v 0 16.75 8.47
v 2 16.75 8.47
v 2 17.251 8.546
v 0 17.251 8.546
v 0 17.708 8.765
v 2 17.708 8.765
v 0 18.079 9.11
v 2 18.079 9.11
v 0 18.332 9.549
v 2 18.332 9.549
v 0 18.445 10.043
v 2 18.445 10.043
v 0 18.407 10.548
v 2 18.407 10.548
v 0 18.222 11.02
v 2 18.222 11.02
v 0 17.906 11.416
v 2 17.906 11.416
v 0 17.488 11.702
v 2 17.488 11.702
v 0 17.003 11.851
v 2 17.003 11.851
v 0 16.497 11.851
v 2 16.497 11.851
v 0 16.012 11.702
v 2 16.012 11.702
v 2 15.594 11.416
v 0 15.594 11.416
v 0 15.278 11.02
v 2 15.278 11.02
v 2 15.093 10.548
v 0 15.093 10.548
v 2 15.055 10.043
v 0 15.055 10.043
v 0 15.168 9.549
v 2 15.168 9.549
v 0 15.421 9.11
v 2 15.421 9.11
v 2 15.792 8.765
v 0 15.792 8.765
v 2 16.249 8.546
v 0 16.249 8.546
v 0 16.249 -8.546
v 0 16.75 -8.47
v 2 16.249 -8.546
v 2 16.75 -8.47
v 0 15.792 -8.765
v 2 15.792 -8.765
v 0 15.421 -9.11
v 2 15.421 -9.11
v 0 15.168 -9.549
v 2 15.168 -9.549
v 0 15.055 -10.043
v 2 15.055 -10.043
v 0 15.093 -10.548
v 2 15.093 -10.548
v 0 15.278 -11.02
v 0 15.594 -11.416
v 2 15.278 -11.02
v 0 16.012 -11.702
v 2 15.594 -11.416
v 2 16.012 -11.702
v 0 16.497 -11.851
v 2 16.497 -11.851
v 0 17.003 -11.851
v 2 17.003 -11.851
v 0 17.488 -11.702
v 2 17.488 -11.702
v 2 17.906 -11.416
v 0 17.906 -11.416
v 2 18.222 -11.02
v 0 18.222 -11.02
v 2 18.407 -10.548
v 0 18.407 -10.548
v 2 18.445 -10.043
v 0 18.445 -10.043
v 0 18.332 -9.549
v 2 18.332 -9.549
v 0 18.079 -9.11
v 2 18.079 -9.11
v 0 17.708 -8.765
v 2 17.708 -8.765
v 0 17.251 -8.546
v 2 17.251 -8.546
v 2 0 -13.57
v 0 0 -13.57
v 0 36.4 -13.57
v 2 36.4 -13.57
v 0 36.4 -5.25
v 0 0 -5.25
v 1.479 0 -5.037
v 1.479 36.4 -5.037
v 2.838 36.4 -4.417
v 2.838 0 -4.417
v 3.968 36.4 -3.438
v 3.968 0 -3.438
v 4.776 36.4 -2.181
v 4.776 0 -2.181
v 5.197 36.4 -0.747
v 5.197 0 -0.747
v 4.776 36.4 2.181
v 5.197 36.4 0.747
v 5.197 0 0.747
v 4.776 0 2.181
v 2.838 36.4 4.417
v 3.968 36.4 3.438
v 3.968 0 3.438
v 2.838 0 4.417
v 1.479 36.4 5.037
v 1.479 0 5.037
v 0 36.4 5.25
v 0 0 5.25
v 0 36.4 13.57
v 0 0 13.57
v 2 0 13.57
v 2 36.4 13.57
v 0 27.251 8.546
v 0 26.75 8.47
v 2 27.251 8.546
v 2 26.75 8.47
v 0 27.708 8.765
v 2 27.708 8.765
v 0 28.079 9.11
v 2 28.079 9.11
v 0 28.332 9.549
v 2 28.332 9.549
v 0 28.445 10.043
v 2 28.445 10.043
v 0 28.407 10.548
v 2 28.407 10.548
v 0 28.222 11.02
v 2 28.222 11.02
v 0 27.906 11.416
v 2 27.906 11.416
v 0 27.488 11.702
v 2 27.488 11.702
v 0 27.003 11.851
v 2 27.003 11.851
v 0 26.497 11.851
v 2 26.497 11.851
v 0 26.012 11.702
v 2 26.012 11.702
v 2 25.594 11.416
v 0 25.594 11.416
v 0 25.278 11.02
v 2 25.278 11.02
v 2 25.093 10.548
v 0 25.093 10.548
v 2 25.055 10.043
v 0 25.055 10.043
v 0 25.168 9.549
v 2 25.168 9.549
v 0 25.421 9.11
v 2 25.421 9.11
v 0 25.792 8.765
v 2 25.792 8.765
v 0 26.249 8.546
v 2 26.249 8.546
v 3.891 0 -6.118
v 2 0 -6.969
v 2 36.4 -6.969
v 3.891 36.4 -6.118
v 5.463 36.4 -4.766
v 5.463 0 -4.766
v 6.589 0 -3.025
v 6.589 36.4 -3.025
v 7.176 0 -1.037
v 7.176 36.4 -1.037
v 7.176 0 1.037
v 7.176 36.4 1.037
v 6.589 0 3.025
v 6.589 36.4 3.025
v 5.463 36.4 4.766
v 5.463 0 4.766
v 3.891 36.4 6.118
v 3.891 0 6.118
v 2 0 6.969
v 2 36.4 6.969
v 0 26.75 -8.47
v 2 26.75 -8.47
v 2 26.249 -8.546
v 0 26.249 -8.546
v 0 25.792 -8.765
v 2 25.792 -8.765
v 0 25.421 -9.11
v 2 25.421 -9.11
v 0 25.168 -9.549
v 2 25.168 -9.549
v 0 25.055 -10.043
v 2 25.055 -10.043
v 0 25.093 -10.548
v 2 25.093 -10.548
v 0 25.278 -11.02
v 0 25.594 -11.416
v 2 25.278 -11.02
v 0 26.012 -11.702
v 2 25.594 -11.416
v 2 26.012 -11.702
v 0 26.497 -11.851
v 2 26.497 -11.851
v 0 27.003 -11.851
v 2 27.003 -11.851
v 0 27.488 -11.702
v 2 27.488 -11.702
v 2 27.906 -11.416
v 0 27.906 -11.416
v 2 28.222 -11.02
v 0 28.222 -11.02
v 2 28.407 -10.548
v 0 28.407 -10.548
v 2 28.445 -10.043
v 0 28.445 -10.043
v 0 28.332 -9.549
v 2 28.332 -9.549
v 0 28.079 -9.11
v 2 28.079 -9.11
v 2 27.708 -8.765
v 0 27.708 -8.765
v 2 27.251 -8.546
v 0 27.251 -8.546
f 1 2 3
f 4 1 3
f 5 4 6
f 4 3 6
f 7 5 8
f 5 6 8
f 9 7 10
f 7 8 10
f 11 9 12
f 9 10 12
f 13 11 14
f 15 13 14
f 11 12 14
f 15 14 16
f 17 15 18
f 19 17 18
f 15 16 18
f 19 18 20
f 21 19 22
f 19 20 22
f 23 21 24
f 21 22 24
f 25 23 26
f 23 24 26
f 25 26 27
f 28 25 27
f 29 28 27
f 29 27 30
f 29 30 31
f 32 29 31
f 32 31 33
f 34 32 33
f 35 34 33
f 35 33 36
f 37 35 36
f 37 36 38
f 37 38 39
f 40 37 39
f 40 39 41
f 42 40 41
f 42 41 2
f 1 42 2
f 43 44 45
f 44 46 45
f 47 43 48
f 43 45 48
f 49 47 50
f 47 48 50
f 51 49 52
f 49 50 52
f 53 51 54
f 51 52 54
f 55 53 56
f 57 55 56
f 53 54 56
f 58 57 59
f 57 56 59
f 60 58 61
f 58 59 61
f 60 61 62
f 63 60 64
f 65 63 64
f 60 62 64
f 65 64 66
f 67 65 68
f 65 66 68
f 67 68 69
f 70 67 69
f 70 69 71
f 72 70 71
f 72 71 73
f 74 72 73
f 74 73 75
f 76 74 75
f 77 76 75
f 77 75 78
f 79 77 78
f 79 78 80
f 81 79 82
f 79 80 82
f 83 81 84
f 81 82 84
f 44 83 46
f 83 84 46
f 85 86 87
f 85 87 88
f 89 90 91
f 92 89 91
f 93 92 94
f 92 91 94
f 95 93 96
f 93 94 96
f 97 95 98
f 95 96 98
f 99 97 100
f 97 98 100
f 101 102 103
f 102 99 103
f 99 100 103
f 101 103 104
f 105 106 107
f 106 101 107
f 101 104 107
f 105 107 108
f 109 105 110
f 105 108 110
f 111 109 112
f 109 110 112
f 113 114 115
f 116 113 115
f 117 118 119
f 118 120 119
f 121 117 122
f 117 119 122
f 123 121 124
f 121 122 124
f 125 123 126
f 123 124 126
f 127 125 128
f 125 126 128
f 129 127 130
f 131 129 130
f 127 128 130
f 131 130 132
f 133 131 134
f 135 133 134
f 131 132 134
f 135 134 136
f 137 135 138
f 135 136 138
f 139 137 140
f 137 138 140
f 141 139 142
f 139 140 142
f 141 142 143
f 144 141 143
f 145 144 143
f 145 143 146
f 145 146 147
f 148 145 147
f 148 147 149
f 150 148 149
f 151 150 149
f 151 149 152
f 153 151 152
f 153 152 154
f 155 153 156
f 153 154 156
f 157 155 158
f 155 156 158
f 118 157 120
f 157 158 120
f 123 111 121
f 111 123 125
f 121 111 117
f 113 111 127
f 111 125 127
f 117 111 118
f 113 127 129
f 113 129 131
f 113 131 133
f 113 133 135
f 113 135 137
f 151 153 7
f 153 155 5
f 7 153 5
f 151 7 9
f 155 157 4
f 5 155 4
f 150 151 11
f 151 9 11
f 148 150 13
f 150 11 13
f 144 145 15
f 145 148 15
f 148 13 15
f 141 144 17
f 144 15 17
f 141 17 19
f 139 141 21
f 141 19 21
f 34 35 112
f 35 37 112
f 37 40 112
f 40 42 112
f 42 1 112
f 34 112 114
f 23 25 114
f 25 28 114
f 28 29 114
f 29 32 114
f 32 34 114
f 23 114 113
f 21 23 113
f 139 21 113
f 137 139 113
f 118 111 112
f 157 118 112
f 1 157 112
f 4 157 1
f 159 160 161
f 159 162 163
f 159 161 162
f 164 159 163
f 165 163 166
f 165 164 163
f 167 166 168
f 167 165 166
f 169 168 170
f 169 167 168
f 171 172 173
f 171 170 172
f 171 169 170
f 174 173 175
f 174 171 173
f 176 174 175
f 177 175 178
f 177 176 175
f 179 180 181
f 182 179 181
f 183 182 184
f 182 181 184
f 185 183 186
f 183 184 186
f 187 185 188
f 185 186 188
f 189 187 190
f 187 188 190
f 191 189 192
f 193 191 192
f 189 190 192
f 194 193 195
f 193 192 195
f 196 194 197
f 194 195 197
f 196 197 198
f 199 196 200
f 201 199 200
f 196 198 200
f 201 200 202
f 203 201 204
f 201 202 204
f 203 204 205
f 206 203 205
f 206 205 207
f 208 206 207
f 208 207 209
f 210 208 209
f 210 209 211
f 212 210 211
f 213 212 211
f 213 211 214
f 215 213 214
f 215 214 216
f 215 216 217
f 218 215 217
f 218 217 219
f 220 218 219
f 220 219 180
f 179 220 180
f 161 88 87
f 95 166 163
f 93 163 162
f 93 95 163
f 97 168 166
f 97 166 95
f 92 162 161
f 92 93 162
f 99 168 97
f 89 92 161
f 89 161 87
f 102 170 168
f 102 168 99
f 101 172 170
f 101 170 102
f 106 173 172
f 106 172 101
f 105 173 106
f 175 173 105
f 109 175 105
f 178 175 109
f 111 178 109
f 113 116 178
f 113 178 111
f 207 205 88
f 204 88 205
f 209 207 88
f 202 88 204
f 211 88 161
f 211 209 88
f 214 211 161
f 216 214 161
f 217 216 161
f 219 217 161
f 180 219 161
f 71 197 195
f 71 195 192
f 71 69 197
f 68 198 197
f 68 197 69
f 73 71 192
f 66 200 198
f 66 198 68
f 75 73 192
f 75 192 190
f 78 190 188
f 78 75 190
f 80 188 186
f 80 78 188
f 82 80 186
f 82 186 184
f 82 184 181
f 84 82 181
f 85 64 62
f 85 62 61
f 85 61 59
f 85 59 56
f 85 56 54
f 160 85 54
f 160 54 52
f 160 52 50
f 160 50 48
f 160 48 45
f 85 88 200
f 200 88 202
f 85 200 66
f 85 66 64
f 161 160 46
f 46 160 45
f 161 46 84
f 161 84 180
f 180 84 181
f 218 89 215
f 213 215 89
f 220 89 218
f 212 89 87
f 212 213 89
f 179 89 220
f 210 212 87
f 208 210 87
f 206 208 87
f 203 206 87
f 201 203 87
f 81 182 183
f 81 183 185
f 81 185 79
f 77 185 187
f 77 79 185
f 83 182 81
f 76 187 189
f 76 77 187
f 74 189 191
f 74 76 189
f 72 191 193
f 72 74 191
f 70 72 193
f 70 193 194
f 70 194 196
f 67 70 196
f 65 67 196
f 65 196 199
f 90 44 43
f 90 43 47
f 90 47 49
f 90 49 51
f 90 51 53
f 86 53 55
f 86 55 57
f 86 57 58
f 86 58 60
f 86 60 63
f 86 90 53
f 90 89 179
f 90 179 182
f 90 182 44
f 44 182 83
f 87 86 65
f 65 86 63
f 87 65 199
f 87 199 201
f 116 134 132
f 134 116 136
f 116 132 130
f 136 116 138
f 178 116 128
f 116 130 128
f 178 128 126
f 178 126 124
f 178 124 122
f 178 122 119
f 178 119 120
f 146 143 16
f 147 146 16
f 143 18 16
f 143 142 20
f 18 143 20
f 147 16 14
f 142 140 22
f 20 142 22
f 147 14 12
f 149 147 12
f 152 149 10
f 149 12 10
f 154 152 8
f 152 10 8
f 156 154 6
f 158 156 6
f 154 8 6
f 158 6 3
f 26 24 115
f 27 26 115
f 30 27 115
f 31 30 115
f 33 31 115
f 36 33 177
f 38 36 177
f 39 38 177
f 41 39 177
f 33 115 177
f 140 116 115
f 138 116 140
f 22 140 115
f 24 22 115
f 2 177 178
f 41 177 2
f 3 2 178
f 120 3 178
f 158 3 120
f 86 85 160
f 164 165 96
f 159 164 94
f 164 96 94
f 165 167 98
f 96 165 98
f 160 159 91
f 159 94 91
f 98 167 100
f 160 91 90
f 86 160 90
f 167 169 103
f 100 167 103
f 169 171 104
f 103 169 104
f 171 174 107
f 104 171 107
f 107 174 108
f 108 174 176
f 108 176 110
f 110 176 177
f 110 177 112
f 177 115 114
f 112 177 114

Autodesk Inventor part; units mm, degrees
ref_plane "YZ Plane" through (0, 0, 0) normal (1, 0, 0) x (0, 1, 0)
ref_plane "XZ Plane" through (0, 0, 0) normal (0, 1, 0) x (-1, 0, 0)
ref_plane "XY Plane" through (0, 0, 0) normal (0, 0, 1) x (1, 0, 0)
sketch "스케치1" plane through (0, 0, 0) normal (0, 1, 0) x (-1, 0, 0)
  arc A0 (0, 5.25) -> (0, -5.25) centre (0, 0) ccw
  line L0 (0, 0) -> (0, 5.25) construction
  line L1 (0, 0) -> (5.25, 0) construction
  line L2 (0, 0) -> (0, -5.25) construction
  arc A1 (-2, 6.9687) -> (-2, -6.9687) centre (0, 0) ccw
  line L3 (0, 0) -> (0, -9) construction
  line L4 (0, 0) -> (0, 9) construction
  line L5 (0, 5.25) -> (0, 13.57)
  line L6 (0, 13.57) -> (-2, 13.57)
  line L7 (-2, 13.57) -> (-2, 6.9687)
  line L8 (0, -5.25) -> (0, -13.57)
  line L9 (0, -13.57) -> (-2, -13.57)
  line L10 (-2, -13.57) -> (-2, -6.9687)
  point P0 (-1, -13.57)
  point P1 (-1, 13.57)
  dimension "d46" = 5.25
  dimension "d47" = 90
  dimension "d48" = 180
  dimension "d49" = 7.25
  dimension "d50" = 180
  dimension "d51" = 13.57
  dimension "d52" = 13.57
  dimension "d53" = 2
  dimension "d54" = 2
extrude "돌출1" add sketch "스케치1" along normal blind 36.4
sketch "스케치2" plane through (2, 0, 13.57) normal (1, 0, 0) x (0, 0, -1)
  line L0 (0, 0) -> (6.6013, 0) projected
  line L1 (6.6013, 0) -> (6.6013, 36.4) projected
  line L2 (0, 36.4) -> (6.6013, 36.4) projected
  line L3 (0, 0) -> (0, 36.4) projected
  circle A0 centre (3.4, 26.75) radius 1.7
  circle A1 centre (3.4, 16.75) radius 1.7
  point P0 (13.57, 0)
  point P1 (3.3007, 36.4)
  dimension "d57" = 3.4
  dimension "d58" = 3.4
  dimension "d60" = 26.75
  dimension "d61" = 16.75
  dimension "d64" = 3.4
extrude "돌출2" cut sketch "스케치2" against normal through all contours A0 | A1
mirror "미러2" about plane through (0, 0, 0) normal (0, 0, 1) of "돌출2"
properties part number "pen고정부"
